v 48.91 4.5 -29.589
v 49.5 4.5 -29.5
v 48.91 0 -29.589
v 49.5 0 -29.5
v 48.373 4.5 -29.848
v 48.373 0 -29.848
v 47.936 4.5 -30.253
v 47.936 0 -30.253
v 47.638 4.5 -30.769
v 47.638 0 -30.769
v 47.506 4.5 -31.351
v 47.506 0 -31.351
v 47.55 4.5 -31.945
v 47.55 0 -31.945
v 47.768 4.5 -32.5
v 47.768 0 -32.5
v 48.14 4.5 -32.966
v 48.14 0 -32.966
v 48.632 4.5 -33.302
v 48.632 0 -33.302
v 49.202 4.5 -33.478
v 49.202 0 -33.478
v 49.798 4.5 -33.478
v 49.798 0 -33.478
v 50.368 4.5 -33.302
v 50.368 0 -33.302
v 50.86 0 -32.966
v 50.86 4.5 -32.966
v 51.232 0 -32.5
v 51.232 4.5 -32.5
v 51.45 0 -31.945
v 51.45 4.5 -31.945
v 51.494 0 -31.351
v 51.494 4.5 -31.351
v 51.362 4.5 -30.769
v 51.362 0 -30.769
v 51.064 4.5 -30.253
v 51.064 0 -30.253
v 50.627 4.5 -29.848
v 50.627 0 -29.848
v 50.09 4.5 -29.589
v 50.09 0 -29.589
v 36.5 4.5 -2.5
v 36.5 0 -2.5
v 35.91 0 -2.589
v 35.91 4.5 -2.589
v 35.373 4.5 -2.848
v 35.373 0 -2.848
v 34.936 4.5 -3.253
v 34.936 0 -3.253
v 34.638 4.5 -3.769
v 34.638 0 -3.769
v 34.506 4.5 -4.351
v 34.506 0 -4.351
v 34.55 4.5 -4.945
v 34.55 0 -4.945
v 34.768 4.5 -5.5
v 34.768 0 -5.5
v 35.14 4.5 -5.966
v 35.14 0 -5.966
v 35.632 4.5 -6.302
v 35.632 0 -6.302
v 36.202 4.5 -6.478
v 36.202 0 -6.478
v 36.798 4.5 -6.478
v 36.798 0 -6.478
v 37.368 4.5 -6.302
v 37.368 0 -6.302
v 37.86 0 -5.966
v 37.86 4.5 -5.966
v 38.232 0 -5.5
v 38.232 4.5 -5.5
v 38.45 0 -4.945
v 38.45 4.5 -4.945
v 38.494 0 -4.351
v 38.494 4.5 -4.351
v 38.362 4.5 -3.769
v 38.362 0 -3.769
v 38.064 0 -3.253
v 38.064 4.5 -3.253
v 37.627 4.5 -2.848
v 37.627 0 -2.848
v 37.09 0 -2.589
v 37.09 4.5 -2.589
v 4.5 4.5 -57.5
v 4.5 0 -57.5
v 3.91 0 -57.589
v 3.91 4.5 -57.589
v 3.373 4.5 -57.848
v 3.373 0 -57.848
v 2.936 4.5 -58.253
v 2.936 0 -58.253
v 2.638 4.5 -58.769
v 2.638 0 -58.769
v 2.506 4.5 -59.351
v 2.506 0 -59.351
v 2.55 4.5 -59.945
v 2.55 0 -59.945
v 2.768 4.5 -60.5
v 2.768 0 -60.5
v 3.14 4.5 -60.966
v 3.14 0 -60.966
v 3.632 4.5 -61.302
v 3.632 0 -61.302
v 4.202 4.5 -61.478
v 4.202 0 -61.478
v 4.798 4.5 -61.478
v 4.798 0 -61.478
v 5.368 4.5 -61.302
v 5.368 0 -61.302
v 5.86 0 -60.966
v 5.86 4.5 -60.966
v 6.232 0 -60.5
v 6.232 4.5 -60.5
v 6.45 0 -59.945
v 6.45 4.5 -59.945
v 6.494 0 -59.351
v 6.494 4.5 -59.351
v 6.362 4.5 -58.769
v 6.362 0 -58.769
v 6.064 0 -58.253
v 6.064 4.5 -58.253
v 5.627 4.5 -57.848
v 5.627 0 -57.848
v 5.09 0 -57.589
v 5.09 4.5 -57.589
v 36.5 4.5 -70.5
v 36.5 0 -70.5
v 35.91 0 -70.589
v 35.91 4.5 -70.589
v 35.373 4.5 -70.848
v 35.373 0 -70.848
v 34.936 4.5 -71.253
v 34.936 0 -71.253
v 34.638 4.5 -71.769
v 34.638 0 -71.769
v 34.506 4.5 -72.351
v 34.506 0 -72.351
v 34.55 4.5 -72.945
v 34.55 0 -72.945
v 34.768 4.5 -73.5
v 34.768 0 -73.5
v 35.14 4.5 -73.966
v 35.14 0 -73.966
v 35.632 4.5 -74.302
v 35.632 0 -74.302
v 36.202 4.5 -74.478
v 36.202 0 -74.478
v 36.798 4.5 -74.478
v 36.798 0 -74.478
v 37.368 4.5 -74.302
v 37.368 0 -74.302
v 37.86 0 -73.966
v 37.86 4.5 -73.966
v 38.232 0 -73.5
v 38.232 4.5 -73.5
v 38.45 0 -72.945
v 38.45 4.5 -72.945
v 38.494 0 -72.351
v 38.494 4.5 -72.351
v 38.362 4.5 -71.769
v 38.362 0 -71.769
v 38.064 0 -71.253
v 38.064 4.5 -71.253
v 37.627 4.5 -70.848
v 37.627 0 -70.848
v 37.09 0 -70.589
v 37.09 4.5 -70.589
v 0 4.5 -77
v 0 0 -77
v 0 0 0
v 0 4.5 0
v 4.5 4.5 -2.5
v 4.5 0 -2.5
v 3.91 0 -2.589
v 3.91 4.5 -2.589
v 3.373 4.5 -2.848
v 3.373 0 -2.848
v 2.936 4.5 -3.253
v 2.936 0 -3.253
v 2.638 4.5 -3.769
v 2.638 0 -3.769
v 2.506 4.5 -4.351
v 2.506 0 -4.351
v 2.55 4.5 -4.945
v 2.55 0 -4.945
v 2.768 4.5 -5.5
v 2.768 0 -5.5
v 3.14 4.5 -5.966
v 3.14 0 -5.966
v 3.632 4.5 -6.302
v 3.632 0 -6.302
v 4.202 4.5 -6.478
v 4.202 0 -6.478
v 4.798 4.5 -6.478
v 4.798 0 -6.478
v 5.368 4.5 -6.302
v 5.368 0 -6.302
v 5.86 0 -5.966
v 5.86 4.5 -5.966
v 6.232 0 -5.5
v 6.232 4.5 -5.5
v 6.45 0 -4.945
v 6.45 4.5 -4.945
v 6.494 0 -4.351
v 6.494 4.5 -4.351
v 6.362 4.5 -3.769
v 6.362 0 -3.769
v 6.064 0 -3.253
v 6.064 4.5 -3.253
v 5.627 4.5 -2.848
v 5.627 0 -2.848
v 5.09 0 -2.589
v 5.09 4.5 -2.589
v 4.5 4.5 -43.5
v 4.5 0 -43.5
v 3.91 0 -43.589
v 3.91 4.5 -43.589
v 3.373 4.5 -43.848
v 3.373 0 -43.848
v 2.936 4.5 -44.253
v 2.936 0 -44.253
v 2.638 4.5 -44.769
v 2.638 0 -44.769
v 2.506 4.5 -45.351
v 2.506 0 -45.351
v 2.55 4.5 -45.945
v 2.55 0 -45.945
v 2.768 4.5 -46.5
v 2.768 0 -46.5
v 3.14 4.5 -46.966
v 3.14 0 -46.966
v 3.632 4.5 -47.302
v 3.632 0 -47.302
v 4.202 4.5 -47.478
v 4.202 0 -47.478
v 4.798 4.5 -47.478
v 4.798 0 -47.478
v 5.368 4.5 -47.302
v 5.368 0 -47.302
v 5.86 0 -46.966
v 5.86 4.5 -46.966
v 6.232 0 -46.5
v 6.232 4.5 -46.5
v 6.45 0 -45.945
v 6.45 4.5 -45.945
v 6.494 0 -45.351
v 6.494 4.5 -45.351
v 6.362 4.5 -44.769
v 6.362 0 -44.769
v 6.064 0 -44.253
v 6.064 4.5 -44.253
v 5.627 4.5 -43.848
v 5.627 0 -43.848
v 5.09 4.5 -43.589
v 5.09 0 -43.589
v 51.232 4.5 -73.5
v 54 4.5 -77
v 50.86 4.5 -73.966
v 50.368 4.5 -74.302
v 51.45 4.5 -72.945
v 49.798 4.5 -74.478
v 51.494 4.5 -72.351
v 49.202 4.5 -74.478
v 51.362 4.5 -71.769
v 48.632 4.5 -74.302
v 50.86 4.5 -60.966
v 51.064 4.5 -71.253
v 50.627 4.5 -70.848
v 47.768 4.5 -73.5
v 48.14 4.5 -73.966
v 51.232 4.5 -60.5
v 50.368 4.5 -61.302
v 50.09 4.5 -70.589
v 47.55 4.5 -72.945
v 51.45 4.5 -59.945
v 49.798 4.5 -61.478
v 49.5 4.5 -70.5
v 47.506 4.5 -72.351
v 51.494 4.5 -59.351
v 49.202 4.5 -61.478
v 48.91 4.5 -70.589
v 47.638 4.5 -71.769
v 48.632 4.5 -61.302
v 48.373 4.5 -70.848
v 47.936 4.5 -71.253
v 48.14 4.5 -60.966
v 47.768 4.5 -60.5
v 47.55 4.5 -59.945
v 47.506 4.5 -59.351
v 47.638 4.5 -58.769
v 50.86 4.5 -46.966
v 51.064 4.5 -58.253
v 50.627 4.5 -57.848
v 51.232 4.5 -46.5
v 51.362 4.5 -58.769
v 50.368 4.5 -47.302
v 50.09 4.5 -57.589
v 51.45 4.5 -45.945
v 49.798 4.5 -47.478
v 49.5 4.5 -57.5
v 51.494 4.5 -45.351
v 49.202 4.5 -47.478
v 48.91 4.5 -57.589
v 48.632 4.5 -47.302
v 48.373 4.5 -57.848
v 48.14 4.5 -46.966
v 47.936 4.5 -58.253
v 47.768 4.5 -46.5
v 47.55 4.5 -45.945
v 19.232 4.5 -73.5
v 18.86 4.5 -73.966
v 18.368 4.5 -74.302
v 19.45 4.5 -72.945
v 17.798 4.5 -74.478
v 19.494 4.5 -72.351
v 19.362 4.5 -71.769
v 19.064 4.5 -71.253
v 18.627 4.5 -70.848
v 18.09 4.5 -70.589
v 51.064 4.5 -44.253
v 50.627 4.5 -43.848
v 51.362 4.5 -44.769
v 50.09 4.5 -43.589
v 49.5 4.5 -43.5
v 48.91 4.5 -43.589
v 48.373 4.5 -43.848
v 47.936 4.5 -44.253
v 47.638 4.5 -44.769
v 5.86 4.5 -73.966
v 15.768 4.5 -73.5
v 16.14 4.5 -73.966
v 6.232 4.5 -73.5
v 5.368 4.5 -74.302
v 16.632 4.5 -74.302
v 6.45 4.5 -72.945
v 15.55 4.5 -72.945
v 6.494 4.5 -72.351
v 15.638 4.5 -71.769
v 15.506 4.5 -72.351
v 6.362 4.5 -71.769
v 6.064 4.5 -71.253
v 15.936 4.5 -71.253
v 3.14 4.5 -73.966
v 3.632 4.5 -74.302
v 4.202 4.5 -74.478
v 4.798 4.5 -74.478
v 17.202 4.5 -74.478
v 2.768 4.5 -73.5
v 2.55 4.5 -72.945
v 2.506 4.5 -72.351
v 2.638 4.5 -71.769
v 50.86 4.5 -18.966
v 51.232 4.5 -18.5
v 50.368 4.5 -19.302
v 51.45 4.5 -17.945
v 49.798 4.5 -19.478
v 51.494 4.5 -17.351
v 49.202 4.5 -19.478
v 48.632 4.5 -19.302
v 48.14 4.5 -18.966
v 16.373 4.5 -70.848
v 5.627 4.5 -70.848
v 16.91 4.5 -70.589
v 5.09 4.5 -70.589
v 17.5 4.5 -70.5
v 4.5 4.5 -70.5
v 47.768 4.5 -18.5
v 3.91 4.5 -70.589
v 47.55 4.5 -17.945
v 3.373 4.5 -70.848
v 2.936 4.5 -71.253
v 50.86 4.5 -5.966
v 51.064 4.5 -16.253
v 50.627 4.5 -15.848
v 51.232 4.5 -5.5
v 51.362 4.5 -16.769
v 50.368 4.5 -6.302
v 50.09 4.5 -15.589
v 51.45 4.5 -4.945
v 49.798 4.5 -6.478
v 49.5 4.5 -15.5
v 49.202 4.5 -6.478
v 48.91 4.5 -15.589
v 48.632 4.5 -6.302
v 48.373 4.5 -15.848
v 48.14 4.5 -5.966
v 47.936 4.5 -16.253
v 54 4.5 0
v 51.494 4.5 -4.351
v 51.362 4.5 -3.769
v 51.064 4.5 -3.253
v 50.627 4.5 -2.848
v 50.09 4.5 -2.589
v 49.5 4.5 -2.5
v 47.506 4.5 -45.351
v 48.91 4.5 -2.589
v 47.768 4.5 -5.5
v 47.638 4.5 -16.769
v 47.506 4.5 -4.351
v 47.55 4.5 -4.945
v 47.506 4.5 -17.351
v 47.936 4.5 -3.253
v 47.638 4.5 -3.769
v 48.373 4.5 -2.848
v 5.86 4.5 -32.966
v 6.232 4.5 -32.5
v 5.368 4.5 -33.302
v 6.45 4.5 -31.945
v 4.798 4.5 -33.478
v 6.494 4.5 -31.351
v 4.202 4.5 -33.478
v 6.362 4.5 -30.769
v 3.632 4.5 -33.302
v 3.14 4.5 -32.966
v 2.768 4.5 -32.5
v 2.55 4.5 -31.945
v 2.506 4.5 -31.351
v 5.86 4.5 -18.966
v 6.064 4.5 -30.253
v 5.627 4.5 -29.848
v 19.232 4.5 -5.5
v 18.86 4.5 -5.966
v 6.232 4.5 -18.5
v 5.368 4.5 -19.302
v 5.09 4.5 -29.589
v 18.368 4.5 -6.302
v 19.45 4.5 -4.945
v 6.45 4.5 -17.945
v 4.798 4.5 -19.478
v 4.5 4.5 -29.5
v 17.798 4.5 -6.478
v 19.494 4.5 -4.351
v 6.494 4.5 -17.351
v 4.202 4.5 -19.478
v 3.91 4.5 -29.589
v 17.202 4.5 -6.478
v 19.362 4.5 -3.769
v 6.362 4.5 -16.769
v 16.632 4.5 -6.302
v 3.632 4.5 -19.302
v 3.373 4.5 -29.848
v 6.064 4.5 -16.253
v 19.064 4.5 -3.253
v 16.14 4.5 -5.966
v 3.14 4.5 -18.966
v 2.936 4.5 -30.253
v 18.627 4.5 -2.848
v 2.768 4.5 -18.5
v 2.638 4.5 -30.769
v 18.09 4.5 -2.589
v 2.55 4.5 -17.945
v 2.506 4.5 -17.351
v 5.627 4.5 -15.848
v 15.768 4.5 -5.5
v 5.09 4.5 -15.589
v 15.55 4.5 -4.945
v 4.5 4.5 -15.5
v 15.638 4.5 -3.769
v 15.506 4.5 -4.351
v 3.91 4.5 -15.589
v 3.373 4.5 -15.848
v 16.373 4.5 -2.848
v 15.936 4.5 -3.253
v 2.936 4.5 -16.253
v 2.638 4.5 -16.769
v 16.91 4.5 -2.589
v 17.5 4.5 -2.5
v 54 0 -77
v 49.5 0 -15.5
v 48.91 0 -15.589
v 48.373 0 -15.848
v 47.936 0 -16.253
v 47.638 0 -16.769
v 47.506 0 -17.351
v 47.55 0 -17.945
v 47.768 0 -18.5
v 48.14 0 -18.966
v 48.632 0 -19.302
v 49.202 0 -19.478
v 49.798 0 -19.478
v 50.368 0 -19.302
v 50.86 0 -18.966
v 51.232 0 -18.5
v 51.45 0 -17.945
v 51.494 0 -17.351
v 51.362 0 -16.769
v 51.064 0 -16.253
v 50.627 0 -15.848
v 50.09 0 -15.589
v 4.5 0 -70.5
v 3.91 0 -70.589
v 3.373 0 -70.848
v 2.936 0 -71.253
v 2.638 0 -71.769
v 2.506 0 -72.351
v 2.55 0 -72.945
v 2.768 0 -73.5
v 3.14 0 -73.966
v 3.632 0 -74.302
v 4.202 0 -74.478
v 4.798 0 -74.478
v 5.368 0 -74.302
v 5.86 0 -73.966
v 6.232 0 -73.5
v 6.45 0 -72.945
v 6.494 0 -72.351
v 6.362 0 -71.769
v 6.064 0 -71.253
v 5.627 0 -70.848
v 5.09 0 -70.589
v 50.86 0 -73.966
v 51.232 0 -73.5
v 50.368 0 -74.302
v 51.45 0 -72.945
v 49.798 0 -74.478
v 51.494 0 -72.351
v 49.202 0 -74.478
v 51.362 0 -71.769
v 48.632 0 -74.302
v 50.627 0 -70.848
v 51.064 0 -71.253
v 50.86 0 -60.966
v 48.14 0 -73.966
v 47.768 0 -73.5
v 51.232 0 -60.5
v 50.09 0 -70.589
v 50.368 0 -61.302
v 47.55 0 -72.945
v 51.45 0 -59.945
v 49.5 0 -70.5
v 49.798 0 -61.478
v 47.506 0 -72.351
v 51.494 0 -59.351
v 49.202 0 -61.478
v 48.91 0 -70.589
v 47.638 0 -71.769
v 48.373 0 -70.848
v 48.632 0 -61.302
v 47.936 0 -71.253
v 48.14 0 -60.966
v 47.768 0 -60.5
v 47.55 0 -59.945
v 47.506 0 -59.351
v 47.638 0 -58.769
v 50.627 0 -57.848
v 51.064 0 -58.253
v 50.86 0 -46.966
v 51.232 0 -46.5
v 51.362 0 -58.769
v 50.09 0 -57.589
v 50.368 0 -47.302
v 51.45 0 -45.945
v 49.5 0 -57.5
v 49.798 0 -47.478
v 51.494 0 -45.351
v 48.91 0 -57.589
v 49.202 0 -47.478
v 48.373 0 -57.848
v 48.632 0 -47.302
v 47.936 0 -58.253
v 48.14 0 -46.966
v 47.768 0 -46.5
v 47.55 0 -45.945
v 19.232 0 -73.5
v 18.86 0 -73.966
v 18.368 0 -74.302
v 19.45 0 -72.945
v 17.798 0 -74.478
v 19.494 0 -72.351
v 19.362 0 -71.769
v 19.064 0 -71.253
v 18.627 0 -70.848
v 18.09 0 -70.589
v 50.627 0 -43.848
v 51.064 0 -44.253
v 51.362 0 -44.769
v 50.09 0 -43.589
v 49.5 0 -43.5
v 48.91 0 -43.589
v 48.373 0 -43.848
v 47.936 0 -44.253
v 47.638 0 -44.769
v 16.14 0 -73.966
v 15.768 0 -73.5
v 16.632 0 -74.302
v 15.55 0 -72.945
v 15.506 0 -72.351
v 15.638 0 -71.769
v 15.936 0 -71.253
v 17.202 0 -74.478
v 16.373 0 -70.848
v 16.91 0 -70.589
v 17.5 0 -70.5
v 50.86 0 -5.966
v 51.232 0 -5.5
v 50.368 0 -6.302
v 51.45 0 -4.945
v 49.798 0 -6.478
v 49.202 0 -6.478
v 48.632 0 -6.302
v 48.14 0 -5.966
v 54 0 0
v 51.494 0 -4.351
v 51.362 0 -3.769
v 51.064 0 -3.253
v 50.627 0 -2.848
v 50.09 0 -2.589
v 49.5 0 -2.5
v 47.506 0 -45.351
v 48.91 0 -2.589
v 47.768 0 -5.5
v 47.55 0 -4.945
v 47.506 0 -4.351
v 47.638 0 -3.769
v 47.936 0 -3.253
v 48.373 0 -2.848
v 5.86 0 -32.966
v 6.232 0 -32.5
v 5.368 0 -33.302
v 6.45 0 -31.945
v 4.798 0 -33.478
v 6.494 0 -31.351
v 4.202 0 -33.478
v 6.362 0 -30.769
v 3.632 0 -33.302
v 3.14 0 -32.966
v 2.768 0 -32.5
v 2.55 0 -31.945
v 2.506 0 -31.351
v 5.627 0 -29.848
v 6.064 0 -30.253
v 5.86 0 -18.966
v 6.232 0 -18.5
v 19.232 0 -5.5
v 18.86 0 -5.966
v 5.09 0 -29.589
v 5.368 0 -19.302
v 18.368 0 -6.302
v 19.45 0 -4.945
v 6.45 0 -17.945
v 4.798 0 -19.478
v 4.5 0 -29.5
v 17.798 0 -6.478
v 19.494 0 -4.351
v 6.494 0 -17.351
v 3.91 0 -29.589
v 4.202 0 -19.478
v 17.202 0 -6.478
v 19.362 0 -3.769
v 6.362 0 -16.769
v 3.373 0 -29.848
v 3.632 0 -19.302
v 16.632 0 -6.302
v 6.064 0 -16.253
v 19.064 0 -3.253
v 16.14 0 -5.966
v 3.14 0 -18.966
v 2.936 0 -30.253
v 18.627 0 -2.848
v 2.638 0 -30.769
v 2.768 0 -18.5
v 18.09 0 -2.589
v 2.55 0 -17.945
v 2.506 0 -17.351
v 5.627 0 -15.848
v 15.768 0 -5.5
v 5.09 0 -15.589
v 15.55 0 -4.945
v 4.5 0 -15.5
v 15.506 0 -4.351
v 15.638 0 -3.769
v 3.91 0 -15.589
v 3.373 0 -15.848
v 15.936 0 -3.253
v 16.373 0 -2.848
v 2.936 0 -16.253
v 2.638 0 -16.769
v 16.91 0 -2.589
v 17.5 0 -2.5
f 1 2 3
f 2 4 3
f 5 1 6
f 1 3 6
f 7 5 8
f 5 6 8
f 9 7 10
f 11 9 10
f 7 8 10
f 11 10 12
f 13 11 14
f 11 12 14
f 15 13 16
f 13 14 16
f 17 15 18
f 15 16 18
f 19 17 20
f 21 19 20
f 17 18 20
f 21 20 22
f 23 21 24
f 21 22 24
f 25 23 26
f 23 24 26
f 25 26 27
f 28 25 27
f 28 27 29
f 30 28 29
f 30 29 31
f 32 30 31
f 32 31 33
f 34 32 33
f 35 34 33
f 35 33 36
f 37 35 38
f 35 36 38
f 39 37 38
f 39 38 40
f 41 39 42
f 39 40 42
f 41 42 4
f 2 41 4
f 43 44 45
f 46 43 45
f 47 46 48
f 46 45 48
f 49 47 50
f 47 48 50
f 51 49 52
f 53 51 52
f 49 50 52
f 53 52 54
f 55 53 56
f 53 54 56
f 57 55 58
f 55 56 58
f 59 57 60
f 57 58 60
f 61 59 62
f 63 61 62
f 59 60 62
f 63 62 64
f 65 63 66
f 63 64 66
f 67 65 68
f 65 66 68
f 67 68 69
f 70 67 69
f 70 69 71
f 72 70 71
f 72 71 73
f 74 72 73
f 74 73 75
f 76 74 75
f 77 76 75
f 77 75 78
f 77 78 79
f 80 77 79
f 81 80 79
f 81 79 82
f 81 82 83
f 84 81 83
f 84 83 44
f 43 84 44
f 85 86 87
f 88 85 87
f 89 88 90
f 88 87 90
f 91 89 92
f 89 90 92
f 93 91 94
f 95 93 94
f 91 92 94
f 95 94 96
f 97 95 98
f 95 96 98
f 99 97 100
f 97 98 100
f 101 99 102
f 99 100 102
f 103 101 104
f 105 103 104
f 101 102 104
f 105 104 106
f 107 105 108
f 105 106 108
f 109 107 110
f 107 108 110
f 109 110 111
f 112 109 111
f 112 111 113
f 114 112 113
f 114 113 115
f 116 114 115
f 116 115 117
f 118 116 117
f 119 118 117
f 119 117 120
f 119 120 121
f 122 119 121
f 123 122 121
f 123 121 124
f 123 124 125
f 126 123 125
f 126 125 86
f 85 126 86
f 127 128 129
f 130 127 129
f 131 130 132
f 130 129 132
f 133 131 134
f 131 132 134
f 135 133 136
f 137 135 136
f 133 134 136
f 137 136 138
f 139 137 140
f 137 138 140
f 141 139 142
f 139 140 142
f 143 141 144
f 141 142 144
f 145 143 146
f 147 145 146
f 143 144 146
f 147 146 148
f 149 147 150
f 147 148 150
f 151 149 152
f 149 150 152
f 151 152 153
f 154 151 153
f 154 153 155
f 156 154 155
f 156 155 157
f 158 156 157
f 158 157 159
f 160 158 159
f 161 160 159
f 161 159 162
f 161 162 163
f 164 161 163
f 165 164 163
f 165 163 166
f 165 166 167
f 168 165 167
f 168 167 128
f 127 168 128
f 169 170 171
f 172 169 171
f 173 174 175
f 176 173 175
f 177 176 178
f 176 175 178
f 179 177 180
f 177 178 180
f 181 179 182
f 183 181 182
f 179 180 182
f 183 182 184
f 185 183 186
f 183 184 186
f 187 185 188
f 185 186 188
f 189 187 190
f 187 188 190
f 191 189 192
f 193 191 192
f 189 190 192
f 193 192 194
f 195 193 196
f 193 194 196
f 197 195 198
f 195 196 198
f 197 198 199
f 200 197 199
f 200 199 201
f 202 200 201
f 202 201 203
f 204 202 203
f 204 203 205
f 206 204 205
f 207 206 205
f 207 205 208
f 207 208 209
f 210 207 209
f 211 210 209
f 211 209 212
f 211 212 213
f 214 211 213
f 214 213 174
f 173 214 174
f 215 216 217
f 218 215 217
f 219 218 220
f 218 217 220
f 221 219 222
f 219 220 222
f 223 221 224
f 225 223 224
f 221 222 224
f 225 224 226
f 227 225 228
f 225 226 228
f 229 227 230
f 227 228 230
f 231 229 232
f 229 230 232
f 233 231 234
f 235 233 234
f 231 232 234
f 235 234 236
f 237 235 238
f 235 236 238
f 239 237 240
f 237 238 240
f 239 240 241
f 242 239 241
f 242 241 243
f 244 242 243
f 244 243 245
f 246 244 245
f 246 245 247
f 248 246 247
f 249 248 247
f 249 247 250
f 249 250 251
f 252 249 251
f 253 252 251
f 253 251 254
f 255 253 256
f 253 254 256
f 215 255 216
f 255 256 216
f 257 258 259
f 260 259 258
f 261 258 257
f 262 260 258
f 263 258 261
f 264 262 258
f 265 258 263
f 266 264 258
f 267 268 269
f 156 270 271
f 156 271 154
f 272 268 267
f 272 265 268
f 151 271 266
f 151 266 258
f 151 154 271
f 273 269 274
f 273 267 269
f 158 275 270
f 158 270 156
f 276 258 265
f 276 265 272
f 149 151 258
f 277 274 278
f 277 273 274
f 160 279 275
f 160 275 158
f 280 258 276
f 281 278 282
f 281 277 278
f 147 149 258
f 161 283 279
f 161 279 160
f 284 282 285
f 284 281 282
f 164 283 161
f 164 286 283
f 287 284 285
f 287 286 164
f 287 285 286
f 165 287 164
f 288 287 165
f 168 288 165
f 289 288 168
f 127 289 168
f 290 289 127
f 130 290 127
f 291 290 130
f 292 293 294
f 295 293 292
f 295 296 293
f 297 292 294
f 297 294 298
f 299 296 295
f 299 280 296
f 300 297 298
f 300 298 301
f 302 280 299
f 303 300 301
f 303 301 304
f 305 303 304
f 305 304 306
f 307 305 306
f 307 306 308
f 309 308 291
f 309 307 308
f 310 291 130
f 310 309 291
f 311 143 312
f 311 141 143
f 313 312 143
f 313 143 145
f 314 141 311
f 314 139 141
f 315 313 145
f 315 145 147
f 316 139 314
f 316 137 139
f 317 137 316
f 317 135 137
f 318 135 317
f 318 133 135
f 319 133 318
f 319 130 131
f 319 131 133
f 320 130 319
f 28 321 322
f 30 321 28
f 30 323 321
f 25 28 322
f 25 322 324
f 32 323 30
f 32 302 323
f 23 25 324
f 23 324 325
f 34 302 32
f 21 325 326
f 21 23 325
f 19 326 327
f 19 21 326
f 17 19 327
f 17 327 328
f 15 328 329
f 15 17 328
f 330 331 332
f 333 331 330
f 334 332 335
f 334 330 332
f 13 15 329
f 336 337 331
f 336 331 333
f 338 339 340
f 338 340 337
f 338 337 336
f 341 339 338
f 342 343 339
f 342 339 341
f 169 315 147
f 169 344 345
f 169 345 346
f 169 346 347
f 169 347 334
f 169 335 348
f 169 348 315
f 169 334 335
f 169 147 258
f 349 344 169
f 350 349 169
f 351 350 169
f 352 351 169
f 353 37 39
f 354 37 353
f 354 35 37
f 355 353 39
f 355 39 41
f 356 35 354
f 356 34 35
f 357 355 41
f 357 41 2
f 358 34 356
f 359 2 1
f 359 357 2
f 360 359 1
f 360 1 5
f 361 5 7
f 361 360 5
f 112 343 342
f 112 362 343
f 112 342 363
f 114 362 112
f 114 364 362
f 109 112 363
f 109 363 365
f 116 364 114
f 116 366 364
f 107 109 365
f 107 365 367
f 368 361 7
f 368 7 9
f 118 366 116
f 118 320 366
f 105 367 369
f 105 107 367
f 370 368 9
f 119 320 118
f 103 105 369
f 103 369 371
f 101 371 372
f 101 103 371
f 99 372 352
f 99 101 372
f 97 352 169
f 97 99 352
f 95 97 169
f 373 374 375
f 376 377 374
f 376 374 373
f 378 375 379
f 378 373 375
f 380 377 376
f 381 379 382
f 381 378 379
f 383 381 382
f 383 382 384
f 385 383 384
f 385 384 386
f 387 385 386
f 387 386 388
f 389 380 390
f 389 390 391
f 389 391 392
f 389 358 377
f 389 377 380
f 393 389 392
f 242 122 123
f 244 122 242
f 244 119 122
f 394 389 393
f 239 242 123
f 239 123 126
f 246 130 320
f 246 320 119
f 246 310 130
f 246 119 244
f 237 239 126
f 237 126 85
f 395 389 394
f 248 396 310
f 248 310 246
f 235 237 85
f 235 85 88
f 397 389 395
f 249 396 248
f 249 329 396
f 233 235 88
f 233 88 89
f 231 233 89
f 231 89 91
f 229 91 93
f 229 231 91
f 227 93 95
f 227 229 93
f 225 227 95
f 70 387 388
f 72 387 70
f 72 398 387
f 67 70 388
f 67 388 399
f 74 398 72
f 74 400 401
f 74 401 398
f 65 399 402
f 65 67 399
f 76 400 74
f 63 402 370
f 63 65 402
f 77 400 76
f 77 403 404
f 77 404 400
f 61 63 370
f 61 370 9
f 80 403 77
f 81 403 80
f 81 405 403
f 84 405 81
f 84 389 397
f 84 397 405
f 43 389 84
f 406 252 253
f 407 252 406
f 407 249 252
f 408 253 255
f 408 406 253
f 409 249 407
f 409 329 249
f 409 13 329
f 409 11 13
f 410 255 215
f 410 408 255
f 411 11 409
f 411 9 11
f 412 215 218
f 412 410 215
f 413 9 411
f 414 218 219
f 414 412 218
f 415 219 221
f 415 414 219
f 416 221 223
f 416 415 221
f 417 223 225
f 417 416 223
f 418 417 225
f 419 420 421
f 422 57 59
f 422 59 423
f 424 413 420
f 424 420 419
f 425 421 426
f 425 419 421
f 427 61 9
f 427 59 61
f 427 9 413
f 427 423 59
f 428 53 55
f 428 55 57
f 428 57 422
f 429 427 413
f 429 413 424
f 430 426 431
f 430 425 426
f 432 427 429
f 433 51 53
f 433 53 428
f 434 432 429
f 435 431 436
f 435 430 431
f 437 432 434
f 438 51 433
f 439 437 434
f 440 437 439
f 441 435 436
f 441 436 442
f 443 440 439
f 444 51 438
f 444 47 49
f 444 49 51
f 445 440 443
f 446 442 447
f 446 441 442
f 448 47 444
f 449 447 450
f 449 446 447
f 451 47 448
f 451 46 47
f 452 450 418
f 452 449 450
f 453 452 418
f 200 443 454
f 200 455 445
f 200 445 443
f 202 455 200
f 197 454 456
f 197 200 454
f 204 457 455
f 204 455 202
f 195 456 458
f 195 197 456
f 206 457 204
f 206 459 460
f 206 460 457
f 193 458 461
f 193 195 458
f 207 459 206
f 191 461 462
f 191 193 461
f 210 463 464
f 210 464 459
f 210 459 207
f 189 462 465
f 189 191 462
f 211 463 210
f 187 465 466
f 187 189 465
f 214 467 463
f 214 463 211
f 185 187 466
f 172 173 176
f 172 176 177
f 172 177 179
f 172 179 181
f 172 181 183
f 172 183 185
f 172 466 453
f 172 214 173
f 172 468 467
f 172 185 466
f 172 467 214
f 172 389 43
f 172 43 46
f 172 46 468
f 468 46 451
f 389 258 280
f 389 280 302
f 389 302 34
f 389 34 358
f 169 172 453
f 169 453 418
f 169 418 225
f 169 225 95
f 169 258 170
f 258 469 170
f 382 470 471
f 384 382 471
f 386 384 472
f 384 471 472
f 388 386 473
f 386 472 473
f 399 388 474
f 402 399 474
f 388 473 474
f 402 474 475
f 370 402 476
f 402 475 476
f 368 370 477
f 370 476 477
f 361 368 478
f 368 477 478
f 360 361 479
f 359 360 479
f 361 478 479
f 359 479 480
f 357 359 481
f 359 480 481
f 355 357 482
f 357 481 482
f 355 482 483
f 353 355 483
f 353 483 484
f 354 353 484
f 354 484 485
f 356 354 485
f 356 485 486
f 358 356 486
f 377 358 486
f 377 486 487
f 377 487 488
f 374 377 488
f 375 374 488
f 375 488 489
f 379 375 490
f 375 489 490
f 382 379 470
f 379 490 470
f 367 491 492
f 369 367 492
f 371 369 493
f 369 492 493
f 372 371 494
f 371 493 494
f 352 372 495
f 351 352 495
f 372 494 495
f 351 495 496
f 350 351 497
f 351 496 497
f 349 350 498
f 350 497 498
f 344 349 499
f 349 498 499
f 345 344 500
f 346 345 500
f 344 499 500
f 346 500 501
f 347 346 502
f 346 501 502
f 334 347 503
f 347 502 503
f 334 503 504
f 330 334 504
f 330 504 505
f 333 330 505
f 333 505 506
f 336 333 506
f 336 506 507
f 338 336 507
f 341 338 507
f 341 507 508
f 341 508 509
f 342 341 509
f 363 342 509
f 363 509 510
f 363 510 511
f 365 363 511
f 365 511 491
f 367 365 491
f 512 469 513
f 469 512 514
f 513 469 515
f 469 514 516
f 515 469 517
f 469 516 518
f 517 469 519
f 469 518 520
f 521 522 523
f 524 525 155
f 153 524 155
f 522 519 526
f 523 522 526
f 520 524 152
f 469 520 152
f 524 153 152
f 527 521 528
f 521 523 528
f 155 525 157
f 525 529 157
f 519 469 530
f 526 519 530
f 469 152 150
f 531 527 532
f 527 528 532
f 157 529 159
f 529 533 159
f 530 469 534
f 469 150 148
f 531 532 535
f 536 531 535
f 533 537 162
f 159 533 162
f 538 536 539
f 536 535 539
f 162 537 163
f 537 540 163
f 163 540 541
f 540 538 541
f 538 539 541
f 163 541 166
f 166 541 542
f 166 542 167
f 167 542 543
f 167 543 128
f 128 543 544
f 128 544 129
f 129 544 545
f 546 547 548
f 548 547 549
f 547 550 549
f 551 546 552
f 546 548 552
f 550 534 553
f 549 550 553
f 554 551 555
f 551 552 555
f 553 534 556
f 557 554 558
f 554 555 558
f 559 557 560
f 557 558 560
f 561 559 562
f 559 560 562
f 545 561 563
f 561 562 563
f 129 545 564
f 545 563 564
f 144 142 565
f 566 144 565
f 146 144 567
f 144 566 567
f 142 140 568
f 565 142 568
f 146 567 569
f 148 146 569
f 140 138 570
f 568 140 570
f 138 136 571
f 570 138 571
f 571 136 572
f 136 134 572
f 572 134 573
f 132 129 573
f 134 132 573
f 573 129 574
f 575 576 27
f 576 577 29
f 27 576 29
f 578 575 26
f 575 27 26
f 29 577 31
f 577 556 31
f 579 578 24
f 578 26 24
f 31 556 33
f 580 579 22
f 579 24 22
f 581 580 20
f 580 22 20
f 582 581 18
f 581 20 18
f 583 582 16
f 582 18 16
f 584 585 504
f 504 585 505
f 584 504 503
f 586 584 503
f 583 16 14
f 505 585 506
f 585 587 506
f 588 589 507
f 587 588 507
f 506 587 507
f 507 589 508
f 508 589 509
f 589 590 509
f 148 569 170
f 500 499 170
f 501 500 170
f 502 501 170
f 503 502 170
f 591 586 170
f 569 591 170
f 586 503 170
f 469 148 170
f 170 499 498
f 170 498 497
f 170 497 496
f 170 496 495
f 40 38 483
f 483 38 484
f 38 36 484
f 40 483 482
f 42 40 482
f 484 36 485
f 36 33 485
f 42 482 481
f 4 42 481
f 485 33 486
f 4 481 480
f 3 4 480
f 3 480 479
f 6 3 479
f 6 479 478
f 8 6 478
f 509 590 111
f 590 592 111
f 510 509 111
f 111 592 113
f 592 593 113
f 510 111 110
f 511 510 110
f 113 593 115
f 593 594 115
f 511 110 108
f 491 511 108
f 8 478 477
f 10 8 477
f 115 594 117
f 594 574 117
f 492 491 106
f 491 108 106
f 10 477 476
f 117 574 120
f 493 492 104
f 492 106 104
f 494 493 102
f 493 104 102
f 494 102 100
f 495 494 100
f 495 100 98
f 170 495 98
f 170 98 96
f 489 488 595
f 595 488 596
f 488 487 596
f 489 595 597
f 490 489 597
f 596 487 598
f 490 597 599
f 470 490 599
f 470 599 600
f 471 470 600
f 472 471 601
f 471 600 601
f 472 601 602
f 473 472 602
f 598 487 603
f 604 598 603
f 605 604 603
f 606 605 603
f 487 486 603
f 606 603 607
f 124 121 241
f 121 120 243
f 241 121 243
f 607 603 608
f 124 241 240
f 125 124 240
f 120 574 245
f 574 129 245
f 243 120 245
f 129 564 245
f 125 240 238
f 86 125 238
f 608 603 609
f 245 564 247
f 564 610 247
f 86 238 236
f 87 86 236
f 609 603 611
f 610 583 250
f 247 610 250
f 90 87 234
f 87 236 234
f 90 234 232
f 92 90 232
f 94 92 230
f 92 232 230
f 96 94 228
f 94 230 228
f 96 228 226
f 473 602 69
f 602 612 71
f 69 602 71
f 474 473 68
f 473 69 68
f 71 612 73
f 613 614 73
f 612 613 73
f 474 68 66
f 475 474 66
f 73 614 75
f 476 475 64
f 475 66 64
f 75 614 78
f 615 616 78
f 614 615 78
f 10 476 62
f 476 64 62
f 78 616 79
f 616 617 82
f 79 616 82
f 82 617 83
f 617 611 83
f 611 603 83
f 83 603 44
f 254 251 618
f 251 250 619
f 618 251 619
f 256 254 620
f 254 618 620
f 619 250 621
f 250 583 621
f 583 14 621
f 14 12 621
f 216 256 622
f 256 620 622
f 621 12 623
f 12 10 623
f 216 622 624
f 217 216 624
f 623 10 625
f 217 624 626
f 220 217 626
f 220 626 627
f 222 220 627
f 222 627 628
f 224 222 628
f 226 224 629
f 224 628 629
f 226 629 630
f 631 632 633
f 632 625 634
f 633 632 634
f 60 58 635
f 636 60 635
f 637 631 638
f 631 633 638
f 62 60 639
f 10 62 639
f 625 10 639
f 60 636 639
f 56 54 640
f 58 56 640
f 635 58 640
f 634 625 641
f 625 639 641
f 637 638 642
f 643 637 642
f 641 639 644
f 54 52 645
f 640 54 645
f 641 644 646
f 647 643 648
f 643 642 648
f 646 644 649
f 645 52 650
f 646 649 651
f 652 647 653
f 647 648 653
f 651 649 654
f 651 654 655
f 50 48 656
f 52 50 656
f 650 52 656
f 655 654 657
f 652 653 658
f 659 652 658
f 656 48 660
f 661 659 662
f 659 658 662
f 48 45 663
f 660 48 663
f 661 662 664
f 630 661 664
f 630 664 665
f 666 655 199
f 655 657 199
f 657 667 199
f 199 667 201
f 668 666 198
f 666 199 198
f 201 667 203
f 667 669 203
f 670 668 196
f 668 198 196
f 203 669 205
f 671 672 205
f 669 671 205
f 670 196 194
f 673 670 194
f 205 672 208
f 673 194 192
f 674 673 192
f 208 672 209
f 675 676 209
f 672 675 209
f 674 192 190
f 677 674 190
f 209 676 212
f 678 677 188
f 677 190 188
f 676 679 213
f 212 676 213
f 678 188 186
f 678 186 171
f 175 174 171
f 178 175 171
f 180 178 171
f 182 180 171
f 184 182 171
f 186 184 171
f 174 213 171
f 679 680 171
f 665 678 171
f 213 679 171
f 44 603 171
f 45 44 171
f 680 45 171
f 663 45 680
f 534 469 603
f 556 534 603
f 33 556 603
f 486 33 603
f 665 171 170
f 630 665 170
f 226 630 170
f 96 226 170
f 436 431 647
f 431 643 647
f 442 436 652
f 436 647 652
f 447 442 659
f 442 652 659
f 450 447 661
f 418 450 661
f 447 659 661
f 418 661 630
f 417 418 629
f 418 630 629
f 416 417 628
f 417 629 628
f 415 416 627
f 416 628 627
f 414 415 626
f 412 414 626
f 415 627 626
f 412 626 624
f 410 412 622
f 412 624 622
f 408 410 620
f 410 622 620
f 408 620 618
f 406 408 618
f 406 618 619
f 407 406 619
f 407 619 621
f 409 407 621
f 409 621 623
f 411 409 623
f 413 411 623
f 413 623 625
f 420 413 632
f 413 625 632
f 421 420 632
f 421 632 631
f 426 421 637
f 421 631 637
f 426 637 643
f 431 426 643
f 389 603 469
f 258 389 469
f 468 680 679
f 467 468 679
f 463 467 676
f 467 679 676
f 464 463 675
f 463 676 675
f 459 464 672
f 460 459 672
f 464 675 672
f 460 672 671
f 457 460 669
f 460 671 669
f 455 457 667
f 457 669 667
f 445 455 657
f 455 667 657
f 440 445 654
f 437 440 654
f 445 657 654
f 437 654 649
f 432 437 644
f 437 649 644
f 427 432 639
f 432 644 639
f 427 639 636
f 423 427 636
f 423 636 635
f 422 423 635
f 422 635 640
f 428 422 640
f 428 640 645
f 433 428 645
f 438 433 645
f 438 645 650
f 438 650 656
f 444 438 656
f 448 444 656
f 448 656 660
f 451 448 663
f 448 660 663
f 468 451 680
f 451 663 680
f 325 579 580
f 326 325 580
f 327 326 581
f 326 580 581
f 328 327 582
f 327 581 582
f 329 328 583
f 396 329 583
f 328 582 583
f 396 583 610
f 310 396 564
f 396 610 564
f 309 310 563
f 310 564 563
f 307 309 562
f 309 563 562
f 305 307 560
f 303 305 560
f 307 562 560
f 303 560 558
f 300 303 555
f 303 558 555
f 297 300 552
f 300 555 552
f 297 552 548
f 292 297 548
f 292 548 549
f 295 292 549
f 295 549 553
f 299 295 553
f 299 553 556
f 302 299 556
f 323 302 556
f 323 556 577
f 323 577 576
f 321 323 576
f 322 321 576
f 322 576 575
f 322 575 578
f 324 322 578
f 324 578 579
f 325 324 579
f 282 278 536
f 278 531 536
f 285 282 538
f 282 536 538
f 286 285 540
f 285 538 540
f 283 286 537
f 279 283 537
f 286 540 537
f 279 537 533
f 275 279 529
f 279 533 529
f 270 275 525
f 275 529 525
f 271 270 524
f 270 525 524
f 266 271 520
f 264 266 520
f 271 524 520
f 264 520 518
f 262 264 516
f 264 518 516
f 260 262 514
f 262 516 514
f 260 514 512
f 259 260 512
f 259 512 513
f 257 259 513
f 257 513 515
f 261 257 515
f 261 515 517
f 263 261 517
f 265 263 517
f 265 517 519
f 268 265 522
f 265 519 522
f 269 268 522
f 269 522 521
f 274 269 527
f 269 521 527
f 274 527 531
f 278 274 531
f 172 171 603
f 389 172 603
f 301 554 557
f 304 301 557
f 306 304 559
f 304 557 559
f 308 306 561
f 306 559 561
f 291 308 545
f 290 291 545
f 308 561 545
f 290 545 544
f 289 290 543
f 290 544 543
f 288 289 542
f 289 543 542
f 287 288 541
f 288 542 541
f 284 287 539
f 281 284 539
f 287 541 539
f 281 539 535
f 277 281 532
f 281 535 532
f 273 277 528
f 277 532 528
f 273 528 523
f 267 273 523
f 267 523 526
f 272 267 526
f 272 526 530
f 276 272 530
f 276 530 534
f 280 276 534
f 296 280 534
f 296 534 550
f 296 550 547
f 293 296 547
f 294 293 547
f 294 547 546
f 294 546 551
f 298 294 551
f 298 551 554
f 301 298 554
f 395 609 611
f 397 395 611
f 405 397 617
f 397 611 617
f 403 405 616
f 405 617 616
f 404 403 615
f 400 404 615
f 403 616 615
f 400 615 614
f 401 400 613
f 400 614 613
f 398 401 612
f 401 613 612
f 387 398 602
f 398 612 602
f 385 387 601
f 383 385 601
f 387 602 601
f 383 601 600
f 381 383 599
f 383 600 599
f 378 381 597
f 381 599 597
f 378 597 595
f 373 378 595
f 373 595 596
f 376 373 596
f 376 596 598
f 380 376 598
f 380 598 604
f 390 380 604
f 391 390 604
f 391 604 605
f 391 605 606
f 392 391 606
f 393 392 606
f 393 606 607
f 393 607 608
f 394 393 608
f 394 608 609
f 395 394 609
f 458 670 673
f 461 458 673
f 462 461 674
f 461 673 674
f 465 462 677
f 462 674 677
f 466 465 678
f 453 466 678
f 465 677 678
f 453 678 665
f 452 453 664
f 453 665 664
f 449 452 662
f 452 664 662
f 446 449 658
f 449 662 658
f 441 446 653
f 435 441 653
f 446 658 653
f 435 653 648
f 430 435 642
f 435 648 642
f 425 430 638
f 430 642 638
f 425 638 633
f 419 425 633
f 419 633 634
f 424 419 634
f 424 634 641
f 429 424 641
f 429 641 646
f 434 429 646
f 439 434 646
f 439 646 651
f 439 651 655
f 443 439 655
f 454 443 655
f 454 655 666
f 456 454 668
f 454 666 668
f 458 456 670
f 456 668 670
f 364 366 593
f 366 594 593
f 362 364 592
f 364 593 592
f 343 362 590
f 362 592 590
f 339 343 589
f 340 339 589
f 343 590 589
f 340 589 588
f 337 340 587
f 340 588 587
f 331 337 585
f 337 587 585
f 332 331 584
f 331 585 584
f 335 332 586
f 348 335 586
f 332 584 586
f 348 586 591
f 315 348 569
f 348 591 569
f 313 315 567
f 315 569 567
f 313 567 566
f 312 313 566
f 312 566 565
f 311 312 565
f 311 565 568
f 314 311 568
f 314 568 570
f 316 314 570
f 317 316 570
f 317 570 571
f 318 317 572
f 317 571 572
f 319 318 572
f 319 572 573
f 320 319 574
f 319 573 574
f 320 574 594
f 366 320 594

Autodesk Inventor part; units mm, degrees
ref_plane "YZ Plane" through (0, 0, 0) normal (1, 0, 0) x (0, 1, 0)
ref_plane "XZ Plane" through (0, 0, 0) normal (0, 1, 0) x (-1, 0, 0)
ref_plane "XY Plane" through (0, 0, 0) normal (0, 0, 1) x (1, 0, 0)
sketch "Sketch1" plane through (0, 0, 0) normal (0, 1, 0) x (-1, 0, 0)
  line L0 (0, 0) -> (-54, 0)
  line L1 (-54, 0) -> (-54, -77)
  line L2 (-54, -77) -> (0, -77)
  line L3 (0, -77) -> (0, 0)
  dimension "d0" = 77
  dimension "d1" = 54
extrude "Extrusion1" add sketch "Sketch1" along normal blind 4.5
sketch "Sketch2" plane through (0, 4.5, 0) normal (0, 1, 0) x (1, 0, 0)
  line L0 (4.5, 4.5) -> (49.5, 4.5) construction
  line L1 (49.5, 4.5) -> (49.5, 72.5) construction
  line L2 (49.5, 72.5) -> (4.5, 72.5) construction
  line L3 (4.5, 72.5) -> (4.5, 4.5) construction
  circle A0 centre (4.5, 4.5) radius 2
  circle A1 centre (17.5, 4.5) radius 2
  circle A2 centre (36.5, 4.5) radius 2
  circle A3 centre (49.5, 4.5) radius 2
  circle A4 centre (4.5, 17.5) radius 2
  circle A5 centre (4.5, 31.5) radius 2
  circle A6 centre (4.5, 59.5) radius 2
  circle A7 centre (4.5, 72.5) radius 2
  circle A8 centre (17.5, 72.5) radius 2
  circle A9 centre (36.5, 72.5) radius 2
  circle A10 centre (49.5, 72.5) radius 2
  circle A11 centre (49.5, 59.5) radius 2
  circle A12 centre (49.5, 45.5) radius 2
  circle A13 centre (49.5, 31.5) radius 2
  circle A14 centre (49.5, 17.5) radius 2
  line L4 (54, 0) -> (54, 77) projected
  line L5 (0, 0) -> (54, 0) projected
  line L6 (54, 77) -> (0, 77) projected
  line L7 (0, 77) -> (0, 0) projected
  circle A15 centre (4.5, 45.5) radius 2
  dimension "d4" = 4
  dimension "d5" = 4
  dimension "d6" = 4
  dimension "d7" = 4
  dimension "d8" = 4
  dimension "d9" = 4
  dimension "d11" = 4
  dimension "d12" = 4
  dimension "d13" = 4
  dimension "d14" = 4
  dimension "d15" = 4
  dimension "d16" = 4
  dimension "d17" = 4
  dimension "d18" = 4
  dimension "d19" = 4
  dimension "d20" = 4.5
  dimension "d21" = 4.5
  dimension "d22" = 4.5
  dimension "d23" = 4.5
  dimension "d24" = 13
  dimension "d25" = 14
  dimension "d26" = 13
  dimension "d27" = 4
  dimension "d28" = 14
  dimension "d29" = 13
  dimension "d30" = 19
  dimension "d31" = 13
  dimension "d32" = 14
  dimension "d33" = 14
  dimension "d34" = 14
  dimension "d35" = 13
  dimension "d36" = 19
hole "Hole1" at (4.5, 4.5, -4.5) at (17.5, 4.5, -4.5) at (4.5, 4.5, -17.5) at (36.5, 4.5, -4.5) at (4.5, 4.5, -31.5) at (49.5, 4.5, -4.5) at (49.5, 4.5, -17.5) at (4.5, 4.5, -45.5) at (4.5, 4.5, -59.5) at (4.5, 4.5, -72.5) at (17.5, 4.5, -72.5) at (36.5, 4.5, -72.5) at (49.5, 4.5, -72.5) at (49.5, 4.5, -59.5) at (49.5, 4.5, -45.5) at (49.5, 4.5, -31.5) direction (0, -1, 0) diameter 4 depth 10 tip angle 118
properties part number "1-35" material "Bronze, Soft Tin"
